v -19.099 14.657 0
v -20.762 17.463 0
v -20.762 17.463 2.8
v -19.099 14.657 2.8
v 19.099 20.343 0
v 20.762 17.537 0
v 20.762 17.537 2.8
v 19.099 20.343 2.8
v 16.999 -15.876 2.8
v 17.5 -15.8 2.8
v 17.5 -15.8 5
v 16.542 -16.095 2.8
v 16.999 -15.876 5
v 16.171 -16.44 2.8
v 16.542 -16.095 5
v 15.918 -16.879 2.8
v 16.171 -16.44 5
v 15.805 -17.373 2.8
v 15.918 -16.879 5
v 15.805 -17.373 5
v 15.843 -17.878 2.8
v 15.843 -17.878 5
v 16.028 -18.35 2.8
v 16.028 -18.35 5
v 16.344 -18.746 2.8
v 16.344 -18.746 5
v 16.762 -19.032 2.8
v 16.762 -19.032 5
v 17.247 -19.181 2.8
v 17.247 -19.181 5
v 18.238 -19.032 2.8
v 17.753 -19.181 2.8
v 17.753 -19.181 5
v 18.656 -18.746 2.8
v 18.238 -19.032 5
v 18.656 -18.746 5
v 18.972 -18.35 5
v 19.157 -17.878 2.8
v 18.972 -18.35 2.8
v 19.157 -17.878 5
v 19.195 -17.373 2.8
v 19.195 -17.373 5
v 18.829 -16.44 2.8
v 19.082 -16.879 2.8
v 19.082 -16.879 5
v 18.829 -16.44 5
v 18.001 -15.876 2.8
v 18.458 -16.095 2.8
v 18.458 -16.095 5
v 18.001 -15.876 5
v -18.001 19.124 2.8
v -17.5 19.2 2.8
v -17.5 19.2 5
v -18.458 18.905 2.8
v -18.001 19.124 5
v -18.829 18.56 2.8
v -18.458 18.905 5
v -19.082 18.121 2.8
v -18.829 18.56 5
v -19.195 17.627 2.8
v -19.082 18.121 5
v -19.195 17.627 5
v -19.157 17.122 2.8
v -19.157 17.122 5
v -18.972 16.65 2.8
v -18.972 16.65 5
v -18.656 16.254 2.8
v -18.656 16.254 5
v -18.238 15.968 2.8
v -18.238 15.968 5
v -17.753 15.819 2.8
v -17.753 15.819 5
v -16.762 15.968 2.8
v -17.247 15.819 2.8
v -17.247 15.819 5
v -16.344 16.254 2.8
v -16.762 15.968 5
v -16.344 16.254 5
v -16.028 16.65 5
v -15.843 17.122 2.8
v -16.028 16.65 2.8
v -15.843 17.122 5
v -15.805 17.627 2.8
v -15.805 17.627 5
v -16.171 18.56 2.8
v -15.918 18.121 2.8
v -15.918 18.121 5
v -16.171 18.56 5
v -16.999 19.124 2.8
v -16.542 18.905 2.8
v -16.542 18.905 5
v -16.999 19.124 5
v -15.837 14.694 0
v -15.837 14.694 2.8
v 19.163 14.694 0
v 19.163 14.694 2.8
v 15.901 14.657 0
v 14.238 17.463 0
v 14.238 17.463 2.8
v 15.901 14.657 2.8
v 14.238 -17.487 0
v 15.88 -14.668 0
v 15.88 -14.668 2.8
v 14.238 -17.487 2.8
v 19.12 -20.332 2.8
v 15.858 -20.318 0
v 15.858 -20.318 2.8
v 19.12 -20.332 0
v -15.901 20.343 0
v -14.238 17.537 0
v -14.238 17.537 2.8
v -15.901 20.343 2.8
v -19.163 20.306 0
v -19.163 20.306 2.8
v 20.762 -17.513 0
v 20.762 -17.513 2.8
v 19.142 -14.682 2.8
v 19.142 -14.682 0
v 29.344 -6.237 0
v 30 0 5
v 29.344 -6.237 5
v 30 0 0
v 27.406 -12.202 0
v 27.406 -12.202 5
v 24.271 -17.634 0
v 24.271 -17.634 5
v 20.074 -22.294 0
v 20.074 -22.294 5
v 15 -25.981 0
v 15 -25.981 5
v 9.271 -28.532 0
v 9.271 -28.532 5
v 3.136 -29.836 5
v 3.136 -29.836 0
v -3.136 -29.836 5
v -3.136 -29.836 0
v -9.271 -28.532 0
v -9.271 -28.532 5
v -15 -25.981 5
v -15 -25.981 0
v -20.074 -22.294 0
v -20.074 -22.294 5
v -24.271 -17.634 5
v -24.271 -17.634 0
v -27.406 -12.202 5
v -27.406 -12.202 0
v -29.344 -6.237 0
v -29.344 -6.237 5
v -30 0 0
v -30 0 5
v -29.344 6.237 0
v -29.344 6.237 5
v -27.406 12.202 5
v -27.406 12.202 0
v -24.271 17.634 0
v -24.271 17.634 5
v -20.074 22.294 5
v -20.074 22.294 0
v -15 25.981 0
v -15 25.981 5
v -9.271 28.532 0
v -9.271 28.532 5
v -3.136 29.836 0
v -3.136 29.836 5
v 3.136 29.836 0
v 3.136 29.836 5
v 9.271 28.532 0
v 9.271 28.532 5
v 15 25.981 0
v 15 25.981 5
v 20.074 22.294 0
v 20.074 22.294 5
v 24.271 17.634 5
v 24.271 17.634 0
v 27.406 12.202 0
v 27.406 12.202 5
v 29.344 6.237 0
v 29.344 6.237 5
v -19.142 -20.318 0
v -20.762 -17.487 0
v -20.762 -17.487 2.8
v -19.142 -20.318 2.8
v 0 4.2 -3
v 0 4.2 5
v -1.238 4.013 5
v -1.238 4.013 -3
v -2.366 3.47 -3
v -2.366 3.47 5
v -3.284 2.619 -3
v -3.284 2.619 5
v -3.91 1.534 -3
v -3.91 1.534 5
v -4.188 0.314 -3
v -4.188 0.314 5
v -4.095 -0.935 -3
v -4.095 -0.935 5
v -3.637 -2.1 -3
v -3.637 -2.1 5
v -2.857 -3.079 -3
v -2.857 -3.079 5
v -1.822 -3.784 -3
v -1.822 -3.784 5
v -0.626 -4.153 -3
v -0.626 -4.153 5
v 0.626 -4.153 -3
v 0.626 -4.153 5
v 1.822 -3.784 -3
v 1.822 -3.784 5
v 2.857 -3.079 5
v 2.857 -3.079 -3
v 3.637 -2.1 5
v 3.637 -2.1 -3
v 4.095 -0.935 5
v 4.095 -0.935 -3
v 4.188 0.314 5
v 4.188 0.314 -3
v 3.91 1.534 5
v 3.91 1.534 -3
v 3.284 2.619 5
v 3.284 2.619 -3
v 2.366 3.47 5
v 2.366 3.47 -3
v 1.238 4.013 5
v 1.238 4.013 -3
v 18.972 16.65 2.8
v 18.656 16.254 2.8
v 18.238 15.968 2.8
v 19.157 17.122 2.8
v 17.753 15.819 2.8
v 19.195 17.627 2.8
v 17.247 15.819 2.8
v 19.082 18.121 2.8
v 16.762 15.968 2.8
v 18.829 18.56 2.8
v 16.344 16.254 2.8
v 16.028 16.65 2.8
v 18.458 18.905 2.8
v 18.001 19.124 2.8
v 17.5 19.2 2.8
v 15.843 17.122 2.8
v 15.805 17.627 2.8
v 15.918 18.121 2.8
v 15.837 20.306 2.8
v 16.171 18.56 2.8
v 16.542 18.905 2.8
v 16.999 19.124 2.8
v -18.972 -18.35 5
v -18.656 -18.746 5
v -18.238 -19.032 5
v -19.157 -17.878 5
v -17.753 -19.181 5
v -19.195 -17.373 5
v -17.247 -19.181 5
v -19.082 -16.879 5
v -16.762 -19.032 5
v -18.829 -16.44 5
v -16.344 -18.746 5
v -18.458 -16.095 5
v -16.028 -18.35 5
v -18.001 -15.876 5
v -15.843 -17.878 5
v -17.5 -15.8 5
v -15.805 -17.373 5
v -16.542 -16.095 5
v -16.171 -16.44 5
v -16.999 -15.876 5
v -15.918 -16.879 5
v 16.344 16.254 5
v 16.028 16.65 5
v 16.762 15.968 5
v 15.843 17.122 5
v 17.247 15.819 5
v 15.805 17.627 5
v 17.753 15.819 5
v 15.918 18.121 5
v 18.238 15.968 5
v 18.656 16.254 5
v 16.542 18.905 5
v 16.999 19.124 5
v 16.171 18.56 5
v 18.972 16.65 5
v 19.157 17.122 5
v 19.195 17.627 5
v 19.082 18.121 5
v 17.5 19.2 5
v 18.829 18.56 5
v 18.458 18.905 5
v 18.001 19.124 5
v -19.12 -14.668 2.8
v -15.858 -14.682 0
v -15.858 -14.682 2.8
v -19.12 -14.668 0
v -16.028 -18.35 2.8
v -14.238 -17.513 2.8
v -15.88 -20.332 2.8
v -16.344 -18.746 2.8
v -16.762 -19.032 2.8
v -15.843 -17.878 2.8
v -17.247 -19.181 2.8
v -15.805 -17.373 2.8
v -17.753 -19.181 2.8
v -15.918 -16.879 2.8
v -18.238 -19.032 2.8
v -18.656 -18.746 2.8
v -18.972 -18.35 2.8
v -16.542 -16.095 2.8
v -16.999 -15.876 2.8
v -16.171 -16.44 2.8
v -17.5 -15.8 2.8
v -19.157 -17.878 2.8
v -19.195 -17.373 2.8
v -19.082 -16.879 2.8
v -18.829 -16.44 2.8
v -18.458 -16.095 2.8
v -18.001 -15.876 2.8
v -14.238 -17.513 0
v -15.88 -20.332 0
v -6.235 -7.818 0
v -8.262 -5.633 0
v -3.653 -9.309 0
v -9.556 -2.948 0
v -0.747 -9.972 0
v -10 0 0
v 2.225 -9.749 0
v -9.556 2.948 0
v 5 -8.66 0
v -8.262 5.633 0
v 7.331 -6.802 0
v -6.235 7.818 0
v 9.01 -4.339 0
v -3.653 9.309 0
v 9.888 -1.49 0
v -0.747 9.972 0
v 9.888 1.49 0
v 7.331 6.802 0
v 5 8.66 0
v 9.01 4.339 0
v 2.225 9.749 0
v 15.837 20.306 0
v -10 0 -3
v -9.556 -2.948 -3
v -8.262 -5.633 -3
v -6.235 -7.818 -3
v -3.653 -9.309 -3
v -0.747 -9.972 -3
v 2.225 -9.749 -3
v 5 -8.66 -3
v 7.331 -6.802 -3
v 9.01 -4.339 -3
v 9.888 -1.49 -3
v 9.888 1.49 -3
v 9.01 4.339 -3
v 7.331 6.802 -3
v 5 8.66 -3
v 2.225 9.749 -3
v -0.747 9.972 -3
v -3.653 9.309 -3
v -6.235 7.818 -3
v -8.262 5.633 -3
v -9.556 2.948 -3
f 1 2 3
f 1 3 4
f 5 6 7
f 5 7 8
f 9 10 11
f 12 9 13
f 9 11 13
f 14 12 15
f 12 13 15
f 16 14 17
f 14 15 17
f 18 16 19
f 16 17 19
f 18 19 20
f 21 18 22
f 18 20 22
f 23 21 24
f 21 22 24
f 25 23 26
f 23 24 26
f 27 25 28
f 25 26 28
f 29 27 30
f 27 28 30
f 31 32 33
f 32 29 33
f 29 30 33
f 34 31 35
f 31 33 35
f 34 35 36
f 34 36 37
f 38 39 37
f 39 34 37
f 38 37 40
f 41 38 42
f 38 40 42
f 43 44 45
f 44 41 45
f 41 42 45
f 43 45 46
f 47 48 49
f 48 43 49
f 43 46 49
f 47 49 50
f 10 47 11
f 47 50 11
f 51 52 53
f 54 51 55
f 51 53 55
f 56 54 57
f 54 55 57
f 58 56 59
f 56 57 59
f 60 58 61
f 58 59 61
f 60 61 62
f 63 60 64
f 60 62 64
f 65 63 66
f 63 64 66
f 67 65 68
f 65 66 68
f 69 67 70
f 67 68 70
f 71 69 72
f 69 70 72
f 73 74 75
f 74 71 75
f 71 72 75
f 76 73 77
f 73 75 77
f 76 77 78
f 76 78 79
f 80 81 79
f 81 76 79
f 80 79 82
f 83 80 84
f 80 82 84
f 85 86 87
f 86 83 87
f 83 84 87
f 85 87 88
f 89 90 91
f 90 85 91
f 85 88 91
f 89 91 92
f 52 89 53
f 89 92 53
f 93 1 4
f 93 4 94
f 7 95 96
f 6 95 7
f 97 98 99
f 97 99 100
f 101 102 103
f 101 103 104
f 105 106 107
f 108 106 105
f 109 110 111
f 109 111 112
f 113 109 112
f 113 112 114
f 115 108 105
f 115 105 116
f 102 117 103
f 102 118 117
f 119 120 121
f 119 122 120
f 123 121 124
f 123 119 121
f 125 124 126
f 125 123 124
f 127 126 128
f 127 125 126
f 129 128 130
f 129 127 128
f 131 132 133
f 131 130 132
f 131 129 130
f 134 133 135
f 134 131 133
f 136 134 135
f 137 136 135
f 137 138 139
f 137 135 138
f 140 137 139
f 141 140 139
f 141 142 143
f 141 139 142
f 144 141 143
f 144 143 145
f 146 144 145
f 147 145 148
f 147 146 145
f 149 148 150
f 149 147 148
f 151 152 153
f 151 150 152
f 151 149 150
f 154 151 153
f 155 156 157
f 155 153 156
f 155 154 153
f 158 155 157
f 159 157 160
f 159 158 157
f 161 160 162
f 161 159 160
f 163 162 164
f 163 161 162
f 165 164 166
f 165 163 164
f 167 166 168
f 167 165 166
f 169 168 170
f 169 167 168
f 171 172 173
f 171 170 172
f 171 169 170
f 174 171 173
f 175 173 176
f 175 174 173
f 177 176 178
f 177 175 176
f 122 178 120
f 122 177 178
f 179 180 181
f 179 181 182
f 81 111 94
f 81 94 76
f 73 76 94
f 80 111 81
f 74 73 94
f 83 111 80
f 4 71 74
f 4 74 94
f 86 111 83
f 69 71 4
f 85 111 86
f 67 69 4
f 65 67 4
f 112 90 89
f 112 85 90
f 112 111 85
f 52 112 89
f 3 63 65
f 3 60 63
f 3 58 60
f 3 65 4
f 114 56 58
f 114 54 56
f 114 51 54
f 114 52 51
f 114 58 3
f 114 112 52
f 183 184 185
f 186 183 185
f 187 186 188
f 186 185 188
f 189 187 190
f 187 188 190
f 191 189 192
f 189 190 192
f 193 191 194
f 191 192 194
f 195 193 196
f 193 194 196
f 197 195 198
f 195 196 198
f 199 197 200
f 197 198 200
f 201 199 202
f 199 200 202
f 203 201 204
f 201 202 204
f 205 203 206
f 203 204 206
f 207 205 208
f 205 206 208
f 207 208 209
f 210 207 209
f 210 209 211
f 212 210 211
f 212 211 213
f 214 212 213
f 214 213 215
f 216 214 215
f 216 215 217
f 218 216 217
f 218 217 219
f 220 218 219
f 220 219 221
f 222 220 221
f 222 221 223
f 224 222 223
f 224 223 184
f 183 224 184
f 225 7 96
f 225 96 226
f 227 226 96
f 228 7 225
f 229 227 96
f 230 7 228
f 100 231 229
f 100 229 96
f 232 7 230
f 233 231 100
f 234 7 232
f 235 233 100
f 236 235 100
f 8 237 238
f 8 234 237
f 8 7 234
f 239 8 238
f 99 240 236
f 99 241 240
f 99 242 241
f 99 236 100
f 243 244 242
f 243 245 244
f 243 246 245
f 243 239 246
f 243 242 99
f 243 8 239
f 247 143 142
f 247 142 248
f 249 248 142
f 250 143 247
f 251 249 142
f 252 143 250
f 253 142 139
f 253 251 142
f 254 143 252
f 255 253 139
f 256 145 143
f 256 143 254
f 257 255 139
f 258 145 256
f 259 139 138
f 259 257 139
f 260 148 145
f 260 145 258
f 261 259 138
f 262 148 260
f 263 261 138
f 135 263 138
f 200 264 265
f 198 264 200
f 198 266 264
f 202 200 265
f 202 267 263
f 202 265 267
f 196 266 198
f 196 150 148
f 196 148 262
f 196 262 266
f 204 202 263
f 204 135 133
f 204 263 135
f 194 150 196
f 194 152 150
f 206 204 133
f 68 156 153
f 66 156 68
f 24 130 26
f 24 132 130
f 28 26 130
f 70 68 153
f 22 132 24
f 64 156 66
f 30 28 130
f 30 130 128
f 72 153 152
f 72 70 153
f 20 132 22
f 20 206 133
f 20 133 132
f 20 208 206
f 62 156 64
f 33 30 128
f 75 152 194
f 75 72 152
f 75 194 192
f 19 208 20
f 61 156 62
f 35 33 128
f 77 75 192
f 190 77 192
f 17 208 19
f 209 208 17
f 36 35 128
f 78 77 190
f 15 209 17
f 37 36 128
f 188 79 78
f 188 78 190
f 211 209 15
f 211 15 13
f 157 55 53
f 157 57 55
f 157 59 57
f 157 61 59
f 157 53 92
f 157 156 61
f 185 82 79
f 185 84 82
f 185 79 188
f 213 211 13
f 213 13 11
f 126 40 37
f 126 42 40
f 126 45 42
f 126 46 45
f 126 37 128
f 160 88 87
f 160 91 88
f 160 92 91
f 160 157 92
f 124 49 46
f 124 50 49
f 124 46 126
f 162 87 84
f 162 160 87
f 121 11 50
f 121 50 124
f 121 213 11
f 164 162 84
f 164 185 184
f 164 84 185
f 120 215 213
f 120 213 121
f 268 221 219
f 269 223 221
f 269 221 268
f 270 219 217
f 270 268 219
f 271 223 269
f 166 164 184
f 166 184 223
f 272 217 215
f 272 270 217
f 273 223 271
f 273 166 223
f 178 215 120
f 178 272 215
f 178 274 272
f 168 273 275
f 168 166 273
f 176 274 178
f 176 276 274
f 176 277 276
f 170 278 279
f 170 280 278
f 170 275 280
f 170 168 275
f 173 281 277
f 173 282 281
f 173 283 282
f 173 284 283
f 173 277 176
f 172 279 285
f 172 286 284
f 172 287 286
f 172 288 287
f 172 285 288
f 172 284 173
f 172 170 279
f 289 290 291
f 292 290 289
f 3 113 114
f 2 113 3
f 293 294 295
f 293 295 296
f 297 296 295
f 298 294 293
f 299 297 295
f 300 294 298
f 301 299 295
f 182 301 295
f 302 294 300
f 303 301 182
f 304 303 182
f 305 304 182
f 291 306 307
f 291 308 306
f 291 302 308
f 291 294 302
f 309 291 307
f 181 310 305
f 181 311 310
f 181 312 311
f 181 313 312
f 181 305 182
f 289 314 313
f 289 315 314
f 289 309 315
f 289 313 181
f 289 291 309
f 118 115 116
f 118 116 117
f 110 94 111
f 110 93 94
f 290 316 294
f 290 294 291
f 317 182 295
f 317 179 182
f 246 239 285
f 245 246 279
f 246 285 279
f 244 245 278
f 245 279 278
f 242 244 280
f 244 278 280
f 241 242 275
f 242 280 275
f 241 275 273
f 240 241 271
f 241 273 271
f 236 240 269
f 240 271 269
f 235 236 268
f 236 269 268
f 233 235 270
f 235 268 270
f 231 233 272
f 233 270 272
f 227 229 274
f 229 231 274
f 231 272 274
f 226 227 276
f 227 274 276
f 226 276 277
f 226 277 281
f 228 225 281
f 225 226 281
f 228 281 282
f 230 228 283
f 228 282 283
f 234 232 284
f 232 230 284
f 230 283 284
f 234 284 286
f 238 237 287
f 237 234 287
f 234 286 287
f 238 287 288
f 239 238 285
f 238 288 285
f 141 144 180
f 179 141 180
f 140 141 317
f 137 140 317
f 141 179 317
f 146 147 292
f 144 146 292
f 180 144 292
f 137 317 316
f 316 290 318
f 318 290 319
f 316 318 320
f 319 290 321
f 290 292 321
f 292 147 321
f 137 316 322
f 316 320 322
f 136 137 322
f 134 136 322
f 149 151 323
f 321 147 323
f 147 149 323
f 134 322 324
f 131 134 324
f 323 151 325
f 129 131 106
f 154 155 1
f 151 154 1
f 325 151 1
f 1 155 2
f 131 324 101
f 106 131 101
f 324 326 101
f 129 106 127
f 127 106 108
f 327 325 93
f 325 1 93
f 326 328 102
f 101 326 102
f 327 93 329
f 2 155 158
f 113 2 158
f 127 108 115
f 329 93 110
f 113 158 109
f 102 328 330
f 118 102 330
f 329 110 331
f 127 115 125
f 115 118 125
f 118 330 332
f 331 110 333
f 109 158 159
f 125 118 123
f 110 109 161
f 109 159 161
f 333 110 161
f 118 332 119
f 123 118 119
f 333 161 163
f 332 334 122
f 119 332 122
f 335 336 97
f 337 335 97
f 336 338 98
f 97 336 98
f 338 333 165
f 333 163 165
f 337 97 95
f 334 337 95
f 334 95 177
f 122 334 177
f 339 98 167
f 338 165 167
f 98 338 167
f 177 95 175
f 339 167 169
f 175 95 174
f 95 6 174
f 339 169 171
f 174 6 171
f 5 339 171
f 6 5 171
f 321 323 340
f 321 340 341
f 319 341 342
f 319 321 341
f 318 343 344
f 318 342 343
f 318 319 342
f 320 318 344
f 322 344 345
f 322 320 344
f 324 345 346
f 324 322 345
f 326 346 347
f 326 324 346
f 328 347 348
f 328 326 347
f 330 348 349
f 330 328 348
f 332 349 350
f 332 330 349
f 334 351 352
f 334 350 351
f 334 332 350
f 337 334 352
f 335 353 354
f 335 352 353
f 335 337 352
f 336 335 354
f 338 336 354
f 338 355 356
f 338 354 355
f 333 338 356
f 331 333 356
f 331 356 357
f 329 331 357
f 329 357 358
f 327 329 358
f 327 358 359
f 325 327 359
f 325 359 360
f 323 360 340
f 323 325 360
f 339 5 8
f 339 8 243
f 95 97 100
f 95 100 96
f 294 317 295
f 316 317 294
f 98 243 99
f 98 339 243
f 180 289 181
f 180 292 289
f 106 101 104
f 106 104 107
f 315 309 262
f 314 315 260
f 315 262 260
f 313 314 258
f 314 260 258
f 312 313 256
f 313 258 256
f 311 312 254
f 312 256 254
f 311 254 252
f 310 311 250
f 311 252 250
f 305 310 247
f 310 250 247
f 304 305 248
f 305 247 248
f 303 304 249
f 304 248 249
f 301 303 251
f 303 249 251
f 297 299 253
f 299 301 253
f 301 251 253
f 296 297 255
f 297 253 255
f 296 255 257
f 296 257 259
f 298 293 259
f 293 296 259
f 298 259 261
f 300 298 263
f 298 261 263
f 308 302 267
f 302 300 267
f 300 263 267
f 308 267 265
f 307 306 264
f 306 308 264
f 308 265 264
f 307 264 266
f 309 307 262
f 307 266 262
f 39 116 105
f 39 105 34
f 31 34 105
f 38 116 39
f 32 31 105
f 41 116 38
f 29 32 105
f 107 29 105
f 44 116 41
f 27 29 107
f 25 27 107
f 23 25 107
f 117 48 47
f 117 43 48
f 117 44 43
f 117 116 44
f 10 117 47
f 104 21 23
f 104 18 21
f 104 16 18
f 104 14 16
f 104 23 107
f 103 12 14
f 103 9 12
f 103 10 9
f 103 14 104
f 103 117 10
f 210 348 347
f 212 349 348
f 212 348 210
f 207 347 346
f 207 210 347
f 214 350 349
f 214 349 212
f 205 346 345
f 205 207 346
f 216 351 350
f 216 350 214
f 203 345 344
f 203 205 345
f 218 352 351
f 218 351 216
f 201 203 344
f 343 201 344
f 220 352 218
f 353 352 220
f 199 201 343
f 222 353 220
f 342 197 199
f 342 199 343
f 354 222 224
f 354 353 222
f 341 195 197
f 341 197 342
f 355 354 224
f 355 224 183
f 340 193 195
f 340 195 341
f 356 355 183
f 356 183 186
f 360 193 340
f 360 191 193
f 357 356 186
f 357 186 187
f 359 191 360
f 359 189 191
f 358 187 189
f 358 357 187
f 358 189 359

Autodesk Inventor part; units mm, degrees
ref_plane "YZ Plane" through (0, 0, 0) normal (1, 0, 0) x (0, 1, 0)
ref_plane "XZ Plane" through (0, 0, 0) normal (0, 1, 0) x (-1, 0, 0)
ref_plane "XY Plane" through (0, 0, 0) normal (0, 0, 1) x (1, 0, 0)
sketch "Sketch1" plane through (0, 0, 0) normal (0, 0, 1) x (1, 0, 0)
  circle A0 centre (0, 0) radius 30
  dimension "d0" = 60
extrude "Main Body" add sketch "Sketch1" along normal blind 5
sketch "Sketch7" plane through (0, 0, 0) normal (0, 0, -1) x (-1, 0, 0)
  circle A0 centre (0, 0) radius 30 projected
  circle A1 centre (0, 0) radius 10
  dimension "d32" = 20
extrude "Raised Centre" add sketch "Sketch7" along normal blind 3 contours A1
sketch "Sketch8" plane through (0, 0, -3) normal (0, 0, -1) x (-1, 0, 0)
  circle A0 centre (0, 0) radius 10 projected
hole "Centre Hole" at (0, 0, -3) direction (0, 0, 1) diameter 8.4 end through all
sketch "Sketch10" plane through (0, 0, 0) normal (0, 0, -1) x (-1, 0, 0)
  circle A0 centre (0, 0) radius 30 projected
  line L0 (-17.5, 17.5) -> (17.5, 17.5) construction
  line L1 (17.5, 17.5) -> (17.5, -17.5) construction
  line L2 (17.5, -17.5) -> (-17.5, -17.5) construction
  line L3 (-17.5, -17.5) -> (-17.5, 17.5) construction
  line L4 (-17.5, 17.5) -> (17.5, -17.5) construction
  line L5 (17.5, 17.5) -> (-17.5, -17.5) construction
  dimension "d55" = 35
  dimension "d56" = 35
hole "Mount Holes" at (17.5, 17.5, 0) at (-17.5, 17.5, 0) at (-17.5, -17.5, 0) at (17.5, -17.5, 0) direction (0, 0, 1) diameter 3.4 end through all
sketch "Sketch11" plane through (0, 0, 0) normal (0, 0, -1) x (-1, 0, 0)
  circle A0 centre (17.5, -17.5) radius 1.7 projected
  circle A1 centre (-17.5, 17.5) radius 1.7 projected
  circle A2 centre (17.5, 17.5) radius 1.7 projected
  circle A3 centre (-17.5, -17.5) radius 1.7 projected
  line L0 (-15.9008, 14.6569) -> (-19.1627, 14.6935)
  line L1 (-19.1627, 14.6935) -> (-20.7618, 17.5367)
  line L2 (-20.7618, 17.5367) -> (-19.0992, 20.3431)
  line L3 (-19.0992, 20.3431) -> (-15.8373, 20.3065)
  line L4 (-15.8373, 20.3065) -> (-14.2382, 17.4633)
  line L5 (-14.2382, 17.4633) -> (-15.9008, 14.6569)
  line L6 (19.0992, 14.6569) -> (15.8373, 14.6935)
  line L7 (15.8373, 14.6935) -> (14.2382, 17.5367)
  line L8 (14.2382, 17.5367) -> (15.9008, 20.3431)
  line L9 (15.9008, 20.3431) -> (19.1627, 20.3065)
  line L10 (19.1627, 20.3065) -> (20.7618, 17.4633)
  line L11 (20.7618, 17.4633) -> (19.0992, 14.6569)
  line L12 (-15.8575, -20.3184) -> (-19.1195, -20.3316)
  line L13 (-19.1195, -20.3316) -> (-20.762, -17.5132)
  line L14 (-20.762, -17.5132) -> (-19.1425, -14.6816)
  line L15 (-19.1425, -14.6816) -> (-15.8805, -14.6684)
  line L16 (-15.8805, -14.6684) -> (-14.238, -17.4868)
  line L17 (-14.238, -17.4868) -> (-15.8575, -20.3184)
  line L18 (19.1425, -20.3184) -> (15.8805, -20.3316)
  line L19 (15.8805, -20.3316) -> (14.238, -17.5132)
  line L20 (14.238, -17.5132) -> (15.8575, -14.6816)
  line L21 (15.8575, -14.6816) -> (19.1195, -14.6684)
  line L22 (19.1195, -14.6684) -> (20.762, -17.4868)
  line L23 (20.762, -17.4868) -> (19.1425, -20.3184)
  dimension "d64" = 5.65
  dimension "d65" = 5.65
  dimension "d66" = 5.65
  dimension "d67" = 5.65
extrude "Nut Traps" cut sketch "Sketch11" against normal blind 2.8
properties part number "Spool Boss"
